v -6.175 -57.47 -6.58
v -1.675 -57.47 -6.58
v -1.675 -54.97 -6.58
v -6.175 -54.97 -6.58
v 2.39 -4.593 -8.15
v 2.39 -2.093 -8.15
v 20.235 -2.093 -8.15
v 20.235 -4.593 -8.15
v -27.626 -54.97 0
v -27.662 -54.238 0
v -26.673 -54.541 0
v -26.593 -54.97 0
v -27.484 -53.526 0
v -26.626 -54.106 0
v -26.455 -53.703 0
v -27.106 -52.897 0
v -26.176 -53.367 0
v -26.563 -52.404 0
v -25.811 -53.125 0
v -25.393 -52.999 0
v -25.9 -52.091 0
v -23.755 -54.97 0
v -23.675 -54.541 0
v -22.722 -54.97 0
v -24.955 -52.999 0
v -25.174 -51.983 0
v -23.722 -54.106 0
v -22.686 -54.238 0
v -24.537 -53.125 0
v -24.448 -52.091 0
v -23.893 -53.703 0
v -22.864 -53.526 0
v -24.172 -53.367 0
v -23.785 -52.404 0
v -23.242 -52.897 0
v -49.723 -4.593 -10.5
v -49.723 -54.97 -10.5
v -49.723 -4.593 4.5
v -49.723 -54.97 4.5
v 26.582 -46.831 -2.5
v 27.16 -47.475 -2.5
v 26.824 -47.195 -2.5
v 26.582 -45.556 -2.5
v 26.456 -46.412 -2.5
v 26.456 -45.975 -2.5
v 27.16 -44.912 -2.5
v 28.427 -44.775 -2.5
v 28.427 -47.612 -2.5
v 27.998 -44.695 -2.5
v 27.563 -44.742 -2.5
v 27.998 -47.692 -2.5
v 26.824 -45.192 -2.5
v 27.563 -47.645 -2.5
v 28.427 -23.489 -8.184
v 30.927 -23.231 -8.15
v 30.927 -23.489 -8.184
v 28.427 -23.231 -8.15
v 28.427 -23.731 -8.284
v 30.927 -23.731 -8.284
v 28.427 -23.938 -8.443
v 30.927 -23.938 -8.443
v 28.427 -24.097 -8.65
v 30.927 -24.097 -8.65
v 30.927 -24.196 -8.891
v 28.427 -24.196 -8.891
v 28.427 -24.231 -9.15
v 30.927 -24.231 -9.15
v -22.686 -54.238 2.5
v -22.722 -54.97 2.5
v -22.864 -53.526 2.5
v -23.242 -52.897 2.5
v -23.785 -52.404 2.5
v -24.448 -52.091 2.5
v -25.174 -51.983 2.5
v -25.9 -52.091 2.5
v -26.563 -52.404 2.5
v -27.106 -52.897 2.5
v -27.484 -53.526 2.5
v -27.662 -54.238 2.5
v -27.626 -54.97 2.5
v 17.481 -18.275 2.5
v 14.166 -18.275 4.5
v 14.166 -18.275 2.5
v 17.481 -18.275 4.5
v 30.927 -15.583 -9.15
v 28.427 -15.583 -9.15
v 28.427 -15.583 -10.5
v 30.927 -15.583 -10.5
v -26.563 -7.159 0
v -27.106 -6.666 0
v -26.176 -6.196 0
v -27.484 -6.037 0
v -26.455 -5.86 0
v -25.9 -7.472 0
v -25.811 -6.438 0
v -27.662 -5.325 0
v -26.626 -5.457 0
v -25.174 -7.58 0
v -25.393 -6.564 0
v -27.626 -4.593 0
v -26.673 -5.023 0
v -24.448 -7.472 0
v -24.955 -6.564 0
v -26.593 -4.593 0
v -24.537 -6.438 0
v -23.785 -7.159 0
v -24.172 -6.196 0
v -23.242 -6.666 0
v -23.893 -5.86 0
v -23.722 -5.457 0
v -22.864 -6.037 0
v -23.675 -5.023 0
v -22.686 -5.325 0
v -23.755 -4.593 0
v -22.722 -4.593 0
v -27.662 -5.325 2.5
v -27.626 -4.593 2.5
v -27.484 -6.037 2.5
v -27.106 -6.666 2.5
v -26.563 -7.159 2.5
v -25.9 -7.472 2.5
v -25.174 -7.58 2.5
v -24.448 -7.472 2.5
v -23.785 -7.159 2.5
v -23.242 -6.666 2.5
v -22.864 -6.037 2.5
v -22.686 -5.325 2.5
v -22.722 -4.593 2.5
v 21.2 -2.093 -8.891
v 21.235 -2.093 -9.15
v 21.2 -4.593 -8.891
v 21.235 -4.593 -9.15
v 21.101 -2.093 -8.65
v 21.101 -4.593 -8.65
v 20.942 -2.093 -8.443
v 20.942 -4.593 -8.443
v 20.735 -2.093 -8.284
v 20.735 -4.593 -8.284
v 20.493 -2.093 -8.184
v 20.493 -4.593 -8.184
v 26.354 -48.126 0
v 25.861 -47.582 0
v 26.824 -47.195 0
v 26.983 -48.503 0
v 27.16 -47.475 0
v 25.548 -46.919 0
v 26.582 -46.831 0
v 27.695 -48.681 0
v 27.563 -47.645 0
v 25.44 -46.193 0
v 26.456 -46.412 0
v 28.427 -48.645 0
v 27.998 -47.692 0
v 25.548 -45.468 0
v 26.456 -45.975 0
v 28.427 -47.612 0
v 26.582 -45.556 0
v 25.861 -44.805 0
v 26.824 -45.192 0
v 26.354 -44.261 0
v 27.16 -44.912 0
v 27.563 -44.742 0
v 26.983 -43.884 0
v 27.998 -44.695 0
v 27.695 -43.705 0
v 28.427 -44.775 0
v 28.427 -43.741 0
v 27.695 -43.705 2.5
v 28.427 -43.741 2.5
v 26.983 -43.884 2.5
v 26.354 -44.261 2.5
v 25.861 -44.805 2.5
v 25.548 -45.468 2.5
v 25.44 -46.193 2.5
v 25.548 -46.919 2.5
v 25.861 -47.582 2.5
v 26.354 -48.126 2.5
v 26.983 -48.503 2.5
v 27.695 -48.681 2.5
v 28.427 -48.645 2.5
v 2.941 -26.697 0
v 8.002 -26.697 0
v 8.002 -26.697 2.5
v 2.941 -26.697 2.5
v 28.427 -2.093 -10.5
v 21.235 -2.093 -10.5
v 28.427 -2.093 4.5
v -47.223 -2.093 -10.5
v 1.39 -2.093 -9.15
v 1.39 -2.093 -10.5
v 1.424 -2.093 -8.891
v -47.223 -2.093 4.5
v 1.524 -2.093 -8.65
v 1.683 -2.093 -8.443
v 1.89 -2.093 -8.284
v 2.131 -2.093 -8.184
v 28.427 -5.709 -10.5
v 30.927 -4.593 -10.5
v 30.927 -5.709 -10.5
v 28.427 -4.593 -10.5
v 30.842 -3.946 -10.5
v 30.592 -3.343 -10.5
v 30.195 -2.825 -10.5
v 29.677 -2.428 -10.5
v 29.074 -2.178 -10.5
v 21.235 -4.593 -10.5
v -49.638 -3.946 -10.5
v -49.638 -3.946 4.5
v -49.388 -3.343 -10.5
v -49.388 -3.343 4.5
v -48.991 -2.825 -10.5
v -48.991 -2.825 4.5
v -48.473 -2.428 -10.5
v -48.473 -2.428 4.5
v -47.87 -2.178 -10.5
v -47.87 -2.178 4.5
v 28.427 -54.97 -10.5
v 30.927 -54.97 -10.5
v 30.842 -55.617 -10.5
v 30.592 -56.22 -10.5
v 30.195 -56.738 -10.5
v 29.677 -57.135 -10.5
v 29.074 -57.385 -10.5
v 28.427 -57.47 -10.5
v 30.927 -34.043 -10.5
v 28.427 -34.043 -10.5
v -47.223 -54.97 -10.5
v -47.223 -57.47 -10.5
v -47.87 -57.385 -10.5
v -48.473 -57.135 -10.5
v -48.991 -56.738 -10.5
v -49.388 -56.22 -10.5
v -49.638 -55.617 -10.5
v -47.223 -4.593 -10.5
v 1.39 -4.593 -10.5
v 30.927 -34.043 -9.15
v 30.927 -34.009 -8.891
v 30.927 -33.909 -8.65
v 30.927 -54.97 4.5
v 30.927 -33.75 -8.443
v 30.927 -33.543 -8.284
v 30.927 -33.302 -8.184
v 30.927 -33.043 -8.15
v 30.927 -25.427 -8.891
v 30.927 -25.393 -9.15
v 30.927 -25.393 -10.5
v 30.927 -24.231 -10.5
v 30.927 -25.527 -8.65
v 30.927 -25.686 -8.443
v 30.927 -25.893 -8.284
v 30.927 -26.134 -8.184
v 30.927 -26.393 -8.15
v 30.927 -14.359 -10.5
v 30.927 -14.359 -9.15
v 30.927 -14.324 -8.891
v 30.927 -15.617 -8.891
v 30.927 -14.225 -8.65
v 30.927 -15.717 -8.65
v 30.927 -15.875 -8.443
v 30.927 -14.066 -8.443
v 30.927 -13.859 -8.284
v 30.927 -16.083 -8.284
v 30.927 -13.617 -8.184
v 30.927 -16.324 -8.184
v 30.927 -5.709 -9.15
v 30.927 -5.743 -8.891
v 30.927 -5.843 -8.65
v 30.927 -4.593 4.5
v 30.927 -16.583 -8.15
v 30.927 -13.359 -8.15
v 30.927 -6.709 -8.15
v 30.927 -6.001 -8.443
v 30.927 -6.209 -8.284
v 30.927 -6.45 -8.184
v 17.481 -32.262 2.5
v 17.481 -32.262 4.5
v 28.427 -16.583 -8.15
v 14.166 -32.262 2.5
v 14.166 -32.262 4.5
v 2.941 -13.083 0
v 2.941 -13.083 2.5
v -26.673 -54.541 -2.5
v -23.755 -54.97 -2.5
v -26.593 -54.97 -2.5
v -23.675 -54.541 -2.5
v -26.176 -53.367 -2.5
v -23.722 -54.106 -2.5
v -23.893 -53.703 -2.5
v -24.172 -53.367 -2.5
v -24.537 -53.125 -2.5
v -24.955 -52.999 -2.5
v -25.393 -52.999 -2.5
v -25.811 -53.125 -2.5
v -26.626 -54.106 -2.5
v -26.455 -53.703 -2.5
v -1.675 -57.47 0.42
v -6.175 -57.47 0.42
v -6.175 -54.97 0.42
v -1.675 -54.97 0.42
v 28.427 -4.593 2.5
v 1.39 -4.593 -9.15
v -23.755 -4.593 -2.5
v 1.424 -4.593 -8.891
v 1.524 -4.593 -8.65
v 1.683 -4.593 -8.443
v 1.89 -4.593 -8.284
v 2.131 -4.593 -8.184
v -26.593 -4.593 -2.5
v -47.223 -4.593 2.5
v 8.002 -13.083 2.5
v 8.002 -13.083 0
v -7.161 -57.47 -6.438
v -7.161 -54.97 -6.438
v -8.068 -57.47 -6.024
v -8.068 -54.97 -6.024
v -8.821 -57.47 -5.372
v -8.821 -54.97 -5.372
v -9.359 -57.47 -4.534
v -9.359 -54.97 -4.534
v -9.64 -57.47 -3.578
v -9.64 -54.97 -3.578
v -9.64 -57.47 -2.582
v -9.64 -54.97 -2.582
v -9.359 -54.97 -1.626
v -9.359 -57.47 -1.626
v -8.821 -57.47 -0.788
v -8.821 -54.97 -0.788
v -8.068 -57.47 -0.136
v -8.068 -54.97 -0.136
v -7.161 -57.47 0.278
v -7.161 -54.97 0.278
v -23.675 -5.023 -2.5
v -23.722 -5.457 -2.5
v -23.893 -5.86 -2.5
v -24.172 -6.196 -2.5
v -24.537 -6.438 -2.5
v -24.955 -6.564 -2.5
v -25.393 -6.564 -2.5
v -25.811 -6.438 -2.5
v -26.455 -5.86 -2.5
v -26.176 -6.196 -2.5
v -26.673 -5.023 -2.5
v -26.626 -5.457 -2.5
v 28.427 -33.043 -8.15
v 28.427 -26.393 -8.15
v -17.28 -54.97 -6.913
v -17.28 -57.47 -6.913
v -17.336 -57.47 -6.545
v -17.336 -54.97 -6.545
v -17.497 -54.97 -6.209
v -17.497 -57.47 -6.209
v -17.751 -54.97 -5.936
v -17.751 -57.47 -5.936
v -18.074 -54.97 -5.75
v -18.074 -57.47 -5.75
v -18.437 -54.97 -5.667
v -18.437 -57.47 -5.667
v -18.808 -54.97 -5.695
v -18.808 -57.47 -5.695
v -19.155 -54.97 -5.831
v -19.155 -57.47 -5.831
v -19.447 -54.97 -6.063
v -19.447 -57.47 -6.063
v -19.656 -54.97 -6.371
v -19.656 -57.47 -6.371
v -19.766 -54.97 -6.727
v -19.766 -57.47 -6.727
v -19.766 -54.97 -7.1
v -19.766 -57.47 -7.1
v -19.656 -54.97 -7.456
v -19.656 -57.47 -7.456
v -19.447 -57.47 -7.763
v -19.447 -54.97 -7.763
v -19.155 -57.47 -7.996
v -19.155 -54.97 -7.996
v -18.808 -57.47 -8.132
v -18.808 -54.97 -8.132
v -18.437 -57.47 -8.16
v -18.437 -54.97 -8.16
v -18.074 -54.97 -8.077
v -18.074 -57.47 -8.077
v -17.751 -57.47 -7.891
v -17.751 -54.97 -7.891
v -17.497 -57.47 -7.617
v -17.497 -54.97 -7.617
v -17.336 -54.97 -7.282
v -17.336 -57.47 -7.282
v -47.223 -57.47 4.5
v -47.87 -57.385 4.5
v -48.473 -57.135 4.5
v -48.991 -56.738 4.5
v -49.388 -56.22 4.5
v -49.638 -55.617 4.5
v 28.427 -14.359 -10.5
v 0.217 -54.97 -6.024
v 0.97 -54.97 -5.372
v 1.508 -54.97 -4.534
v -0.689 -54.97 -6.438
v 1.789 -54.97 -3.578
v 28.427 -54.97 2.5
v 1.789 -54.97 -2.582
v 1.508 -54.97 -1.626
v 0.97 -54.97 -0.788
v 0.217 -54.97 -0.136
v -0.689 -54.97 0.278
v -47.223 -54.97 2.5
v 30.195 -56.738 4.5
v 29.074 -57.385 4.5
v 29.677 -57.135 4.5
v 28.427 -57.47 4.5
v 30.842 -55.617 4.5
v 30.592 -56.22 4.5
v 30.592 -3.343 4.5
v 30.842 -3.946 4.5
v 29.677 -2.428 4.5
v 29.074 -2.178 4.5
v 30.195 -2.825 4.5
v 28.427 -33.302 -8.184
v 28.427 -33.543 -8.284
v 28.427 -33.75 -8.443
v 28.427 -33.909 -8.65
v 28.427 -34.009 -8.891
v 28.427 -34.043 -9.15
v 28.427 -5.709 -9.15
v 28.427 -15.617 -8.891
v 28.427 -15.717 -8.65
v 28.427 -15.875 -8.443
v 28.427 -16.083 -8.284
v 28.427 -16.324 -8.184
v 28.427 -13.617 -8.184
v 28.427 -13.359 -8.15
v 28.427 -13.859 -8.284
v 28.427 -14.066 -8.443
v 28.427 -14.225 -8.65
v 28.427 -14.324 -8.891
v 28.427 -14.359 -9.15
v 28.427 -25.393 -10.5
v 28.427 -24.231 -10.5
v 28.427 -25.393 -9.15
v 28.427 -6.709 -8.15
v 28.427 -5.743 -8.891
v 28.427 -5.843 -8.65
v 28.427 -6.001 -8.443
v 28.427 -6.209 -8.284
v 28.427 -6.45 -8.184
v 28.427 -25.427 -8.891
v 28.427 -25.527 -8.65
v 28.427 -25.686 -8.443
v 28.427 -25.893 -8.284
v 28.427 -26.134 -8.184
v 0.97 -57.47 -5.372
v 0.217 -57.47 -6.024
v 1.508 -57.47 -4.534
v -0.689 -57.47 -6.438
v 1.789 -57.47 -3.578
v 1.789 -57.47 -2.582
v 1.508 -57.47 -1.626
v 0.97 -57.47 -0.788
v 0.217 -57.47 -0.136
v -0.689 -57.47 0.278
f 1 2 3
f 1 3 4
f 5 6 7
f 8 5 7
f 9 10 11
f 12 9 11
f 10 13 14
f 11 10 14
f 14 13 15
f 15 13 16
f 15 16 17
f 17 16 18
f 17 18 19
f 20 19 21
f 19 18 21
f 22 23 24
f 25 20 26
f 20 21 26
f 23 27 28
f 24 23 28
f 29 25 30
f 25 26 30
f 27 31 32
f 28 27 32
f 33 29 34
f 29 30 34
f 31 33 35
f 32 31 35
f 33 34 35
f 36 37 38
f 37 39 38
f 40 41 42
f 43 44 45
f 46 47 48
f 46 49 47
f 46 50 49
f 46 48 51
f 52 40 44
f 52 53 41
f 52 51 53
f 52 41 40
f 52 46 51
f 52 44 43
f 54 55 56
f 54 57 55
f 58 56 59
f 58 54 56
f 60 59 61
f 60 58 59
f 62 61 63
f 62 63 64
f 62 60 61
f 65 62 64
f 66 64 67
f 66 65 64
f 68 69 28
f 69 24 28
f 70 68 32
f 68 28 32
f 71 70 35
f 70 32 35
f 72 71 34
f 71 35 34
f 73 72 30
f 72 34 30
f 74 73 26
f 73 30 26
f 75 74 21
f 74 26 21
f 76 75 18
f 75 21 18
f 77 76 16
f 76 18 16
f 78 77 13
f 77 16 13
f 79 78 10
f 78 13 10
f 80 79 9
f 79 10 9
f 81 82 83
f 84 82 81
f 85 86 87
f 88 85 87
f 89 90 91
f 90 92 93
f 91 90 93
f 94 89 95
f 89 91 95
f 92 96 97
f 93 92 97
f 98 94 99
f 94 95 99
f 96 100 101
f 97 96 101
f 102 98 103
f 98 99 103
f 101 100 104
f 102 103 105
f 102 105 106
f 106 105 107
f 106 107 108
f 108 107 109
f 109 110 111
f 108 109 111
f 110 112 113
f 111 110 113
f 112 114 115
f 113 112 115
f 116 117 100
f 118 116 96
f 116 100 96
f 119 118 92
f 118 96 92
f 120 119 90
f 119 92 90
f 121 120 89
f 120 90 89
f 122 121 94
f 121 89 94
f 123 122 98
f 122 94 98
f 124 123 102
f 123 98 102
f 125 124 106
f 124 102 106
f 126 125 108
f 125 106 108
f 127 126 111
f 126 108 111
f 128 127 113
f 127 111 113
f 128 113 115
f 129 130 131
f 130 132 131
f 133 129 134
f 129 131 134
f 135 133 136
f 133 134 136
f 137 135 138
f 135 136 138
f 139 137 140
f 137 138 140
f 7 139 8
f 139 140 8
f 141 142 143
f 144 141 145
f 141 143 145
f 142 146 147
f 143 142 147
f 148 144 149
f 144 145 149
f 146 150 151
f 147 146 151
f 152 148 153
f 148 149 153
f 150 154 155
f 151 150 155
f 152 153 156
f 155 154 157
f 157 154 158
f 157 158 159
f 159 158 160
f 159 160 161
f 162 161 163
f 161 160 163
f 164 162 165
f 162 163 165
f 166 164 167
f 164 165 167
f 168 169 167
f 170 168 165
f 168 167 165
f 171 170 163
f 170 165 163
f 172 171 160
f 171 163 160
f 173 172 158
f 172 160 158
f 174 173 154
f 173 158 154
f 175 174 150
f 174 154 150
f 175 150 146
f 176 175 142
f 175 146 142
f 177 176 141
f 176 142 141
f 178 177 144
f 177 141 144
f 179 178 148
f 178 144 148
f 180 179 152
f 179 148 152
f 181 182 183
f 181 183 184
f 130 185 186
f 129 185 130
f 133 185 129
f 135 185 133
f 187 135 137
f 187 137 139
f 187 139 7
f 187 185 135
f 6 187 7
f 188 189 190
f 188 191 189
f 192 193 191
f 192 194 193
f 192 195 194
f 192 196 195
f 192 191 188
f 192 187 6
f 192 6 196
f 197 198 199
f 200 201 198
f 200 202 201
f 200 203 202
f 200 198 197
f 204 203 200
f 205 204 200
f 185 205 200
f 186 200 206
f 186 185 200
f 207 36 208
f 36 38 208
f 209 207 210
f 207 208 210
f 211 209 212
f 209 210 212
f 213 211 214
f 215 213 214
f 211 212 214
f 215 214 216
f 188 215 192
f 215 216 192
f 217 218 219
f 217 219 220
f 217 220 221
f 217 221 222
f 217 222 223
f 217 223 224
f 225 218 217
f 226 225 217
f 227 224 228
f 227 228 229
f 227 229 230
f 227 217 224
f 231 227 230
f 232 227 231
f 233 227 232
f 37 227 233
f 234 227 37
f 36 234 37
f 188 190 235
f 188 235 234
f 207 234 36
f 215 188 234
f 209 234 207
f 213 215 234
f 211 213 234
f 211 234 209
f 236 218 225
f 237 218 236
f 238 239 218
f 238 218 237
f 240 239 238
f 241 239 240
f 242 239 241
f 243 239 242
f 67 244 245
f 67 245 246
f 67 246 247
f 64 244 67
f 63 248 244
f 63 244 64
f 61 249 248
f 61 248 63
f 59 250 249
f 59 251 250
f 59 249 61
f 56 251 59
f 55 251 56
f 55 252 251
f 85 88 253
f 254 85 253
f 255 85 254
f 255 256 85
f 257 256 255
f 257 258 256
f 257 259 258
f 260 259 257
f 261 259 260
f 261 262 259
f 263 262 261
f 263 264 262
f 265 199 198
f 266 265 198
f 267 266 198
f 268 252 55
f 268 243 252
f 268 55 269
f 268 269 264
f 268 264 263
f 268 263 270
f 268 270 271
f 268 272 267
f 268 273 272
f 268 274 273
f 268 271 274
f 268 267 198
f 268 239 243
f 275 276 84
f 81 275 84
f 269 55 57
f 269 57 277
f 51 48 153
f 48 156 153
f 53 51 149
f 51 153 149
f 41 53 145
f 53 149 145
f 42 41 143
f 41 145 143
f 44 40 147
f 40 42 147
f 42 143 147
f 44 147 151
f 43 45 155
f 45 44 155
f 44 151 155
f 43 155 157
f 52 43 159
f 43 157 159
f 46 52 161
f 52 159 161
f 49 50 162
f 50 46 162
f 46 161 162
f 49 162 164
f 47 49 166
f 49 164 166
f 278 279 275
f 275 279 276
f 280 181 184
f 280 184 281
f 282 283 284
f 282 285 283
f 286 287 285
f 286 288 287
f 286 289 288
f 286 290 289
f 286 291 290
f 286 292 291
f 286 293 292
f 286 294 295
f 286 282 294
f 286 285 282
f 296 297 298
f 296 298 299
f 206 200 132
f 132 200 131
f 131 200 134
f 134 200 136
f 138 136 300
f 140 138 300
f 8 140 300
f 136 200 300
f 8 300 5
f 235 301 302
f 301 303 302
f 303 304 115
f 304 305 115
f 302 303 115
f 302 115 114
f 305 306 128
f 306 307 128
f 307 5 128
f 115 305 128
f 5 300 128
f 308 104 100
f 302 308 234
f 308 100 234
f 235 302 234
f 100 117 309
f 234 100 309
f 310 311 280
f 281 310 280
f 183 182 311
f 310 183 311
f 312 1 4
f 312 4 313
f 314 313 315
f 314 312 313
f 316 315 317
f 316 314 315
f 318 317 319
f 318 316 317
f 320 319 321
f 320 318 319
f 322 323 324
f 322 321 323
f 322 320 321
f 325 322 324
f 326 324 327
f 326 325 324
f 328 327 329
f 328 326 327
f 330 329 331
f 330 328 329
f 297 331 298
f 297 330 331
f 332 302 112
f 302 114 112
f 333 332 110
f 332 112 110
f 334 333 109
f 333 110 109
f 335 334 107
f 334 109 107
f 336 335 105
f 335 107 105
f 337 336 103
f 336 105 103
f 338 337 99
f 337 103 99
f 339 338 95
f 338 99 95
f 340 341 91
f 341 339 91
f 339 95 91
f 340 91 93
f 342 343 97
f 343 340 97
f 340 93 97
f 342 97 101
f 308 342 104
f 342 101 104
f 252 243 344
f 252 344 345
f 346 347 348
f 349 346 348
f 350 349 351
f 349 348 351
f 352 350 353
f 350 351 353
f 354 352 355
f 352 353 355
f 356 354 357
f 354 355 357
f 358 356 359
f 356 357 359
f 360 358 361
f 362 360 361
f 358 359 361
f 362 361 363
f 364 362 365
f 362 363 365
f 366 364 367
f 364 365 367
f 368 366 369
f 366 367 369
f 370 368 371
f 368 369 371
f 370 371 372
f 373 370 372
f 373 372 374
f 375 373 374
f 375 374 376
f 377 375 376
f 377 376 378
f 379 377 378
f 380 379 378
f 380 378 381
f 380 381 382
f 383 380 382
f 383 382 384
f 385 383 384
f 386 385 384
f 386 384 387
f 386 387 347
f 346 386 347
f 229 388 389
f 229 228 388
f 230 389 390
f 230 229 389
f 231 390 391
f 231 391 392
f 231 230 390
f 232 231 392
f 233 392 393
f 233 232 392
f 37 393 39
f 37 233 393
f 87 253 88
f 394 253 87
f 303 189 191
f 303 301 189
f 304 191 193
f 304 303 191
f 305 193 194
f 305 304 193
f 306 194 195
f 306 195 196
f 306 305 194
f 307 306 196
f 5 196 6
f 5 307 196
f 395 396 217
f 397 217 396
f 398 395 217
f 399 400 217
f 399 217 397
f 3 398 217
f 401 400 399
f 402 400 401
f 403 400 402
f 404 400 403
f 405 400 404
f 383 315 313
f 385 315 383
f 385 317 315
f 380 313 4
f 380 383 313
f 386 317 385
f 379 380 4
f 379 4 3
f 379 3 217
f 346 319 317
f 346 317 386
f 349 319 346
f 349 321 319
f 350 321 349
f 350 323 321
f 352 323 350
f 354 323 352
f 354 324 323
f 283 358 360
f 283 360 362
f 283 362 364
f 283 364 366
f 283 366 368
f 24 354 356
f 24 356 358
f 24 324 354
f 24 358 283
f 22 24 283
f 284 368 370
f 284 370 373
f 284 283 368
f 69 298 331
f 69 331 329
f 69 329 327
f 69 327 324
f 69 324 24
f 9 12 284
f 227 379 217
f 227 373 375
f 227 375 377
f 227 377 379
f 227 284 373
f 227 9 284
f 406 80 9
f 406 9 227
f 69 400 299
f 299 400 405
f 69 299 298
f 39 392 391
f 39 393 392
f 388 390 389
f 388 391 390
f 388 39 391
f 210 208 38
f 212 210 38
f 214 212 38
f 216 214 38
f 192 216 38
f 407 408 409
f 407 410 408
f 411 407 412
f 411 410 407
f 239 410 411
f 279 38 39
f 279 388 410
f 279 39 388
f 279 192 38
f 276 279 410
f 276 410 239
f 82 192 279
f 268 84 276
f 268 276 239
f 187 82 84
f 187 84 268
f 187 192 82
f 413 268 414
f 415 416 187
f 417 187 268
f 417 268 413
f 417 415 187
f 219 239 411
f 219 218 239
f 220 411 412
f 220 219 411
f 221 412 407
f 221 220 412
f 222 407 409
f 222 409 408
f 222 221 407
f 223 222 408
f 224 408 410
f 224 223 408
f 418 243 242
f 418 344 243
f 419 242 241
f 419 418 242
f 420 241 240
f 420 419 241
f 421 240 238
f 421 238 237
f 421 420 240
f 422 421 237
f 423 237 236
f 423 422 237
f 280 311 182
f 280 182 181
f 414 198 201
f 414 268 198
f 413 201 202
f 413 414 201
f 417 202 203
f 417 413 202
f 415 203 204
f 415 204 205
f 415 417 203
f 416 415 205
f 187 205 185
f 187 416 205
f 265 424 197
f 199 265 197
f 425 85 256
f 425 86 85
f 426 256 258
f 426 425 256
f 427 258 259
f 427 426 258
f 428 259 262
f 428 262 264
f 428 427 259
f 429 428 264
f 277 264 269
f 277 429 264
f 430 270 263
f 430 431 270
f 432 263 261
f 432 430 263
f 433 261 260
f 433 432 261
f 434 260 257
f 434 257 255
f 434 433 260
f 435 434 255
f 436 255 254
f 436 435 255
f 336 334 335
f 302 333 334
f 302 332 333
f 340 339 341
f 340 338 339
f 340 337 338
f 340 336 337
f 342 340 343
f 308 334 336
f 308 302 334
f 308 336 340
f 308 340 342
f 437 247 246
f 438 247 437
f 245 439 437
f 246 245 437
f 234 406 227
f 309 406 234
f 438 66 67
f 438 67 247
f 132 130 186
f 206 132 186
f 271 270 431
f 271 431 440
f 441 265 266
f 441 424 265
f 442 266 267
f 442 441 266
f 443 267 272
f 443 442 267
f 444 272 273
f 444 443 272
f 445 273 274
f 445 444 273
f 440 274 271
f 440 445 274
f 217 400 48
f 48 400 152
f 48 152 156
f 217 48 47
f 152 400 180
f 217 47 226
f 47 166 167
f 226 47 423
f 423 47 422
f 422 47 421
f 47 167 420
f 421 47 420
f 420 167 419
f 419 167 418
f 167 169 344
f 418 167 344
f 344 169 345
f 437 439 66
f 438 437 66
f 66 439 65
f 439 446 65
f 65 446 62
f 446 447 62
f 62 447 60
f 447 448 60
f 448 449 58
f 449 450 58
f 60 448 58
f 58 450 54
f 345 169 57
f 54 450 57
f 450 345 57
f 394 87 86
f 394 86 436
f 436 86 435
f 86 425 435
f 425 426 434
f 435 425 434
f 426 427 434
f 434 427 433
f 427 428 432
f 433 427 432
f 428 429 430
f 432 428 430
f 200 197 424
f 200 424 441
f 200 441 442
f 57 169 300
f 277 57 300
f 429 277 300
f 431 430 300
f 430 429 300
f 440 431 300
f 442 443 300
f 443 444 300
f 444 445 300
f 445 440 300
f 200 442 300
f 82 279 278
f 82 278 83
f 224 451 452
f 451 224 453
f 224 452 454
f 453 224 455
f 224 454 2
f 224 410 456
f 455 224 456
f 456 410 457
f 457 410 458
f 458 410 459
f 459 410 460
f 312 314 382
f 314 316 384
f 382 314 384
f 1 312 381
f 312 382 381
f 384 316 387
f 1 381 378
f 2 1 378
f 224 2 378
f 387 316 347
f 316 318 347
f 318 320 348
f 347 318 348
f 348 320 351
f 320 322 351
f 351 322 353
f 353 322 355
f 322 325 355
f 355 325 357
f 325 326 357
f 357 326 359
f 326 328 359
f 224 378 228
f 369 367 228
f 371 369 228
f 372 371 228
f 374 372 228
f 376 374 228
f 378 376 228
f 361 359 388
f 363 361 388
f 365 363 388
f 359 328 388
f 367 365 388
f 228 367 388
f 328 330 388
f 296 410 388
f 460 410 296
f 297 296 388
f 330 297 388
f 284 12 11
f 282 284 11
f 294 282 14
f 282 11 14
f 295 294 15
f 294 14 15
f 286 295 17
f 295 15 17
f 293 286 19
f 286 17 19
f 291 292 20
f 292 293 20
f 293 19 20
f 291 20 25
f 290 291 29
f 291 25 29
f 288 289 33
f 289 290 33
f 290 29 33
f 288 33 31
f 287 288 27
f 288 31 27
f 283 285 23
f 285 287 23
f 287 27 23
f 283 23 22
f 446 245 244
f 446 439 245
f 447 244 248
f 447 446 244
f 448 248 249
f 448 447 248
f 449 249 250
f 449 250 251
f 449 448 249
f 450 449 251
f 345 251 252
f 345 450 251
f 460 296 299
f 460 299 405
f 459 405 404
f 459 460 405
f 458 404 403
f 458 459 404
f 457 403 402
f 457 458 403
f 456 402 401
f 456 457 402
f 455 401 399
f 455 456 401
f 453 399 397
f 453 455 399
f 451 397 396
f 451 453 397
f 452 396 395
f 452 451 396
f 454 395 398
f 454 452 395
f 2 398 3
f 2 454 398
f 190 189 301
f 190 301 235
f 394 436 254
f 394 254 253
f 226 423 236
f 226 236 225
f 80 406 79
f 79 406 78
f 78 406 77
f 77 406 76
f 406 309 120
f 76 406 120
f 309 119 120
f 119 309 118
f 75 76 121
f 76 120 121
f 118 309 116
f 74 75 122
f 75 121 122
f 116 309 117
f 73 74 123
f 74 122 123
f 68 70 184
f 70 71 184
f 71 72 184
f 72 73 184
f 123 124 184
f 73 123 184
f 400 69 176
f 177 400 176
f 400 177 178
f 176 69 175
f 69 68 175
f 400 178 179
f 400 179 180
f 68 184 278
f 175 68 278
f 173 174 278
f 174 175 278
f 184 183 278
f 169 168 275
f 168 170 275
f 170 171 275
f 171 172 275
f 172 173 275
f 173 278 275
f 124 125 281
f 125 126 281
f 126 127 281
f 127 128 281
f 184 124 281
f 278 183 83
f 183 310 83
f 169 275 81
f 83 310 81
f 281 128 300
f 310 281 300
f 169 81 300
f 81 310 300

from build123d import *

# Parameters (mm, degrees)
SKETCH_1_R          = 2.5
EXTRUDE_1_DEPTH     = 2.5
EXTRUDE_1_2_DEPTH   = 2.5
EXTRUDE_1_3_DEPTH   = 2.5
SKETCH_2_R          = 1.5
EXTRUDE_2_DEPTH     = 2.5
SKETCH_3_W          = 5.060610533
SKETCH_3_H          = 13.613755096
EXTRUDE_3_DEPTH     = 2.5
SKETCH_4_W          = 80.650749302
SKETCH_4_H          = 55.377698756
EXTRUDE_4_DEPTH     = 2
SKETCH_5_W          = 80.650749302
SKETCH_5_H          = 55.377698756
SKETCH_5_W_2        = 75.650749302
SKETCH_5_H_2        = 50.377698756
EXTRUDE_5_DEPTH     = 13
FILLET_1_R          = 2.5
CUT_EXTRUDE_1_DEPTH = 2.6
SKETCH_8_W          = 3.315326588
SKETCH_8_H          = 13.986534041
CUT_EXTRUDE_2_DEPTH = 2
SKETCH_9_W          = 2.35
SKETCH_9_H          = 8.65
SKETCH_9_H_2        = 8.647957695
CUT_EXTRUDE_3_DEPTH = 3
FILLET_2_R          = 1
SKETCH_10_W         = 19.844488107
SKETCH_10_H         = 2.35
CUT_EXTRUDE_4_DEPTH = 3
FILLET_3_R          = 1
SKETCH_11_R         = 1.25
CUT_EXTRUDE_5_DEPTH = 6.8


with BuildPart() as part:
    # 草图1 → 凸台-拉伸1 (new body)
    with BuildSketch(Plane.XY):
        with Locations((-25.173975108, -5.08001016)):
            Circle(SKETCH_1_R)
    extrude(amount=EXTRUDE_1_DEPTH)



with BuildPart() as body_2:
    # 草图1 → Extrude 1 2 (new body)
    with BuildSketch(Plane.XY):
        with Locations((-25.173975108, -54.483108966)):
            Circle(SKETCH_1_R)
    extrude(amount=EXTRUDE_1_2_DEPTH)


with BuildPart() as body_3:
    # 草图1 → Extrude 1 3 (new body)
    with BuildSketch(Plane.XY):
        with Locations((27.94005588, -46.193418847)):
            Circle(SKETCH_1_R)
    extrude(amount=EXTRUDE_1_3_DEPTH)


with BuildPart() as part_1:
    add(part.part)

    add(body_2.part)  # 凸台-拉伸2 merges body 2

    add(body_3.part)  # 凸台-拉伸2 merges body 3
    # 草图2 → 凸台-拉伸2 (add)
    with BuildSketch(Plane(origin=(0, 0, 0), x_dir=(-1, 0, 0), z_dir=(0, 0, -1))):
        with Locations((25.173975108, -5.08001016)):
            Circle(SKETCH_2_R)
        with Locations((25.173975108, -54.483108966)):
            Circle(SKETCH_2_R)
        with Locations((-27.94005588, -46.193418847)):
            Circle(SKETCH_2_R)
    extrude(amount=EXTRUDE_2_DEPTH)



with BuildPart() as body_2_2:
    # 草图3 → 凸台-拉伸3 (new body)
    with BuildSketch(Plane(origin=(0, 0, 0), x_dir=(-1, 0, 0), z_dir=(0, 0, -1))):
        with Locations((-5.471223868, -19.889889862)):
            Rectangle(SKETCH_3_W, SKETCH_3_H)
    extrude(amount=-EXTRUDE_3_DEPTH)


with BuildPart() as part_2:
    add(part_1.part)

    add(body_2_2.part)  # 凸台-拉伸4 merges body 2 2
    # 草图4 → 凸台-拉伸4 (add)
    with BuildSketch(Plane.XY.offset(2.5)):
        with Locations((-9.398018796, -29.781559563)):
            Rectangle(SKETCH_4_W, SKETCH_4_H)
    extrude(amount=EXTRUDE_4_DEPTH)

    # 草图5 → 凸台-拉伸5 (add)
    with BuildSketch(Plane(origin=(0, 0, 2.5), x_dir=(-1, 0, 0), z_dir=(0, 0, -1))):
        with Locations((9.398018796, -29.781559563)):
            Rectangle(SKETCH_5_W, SKETCH_5_H)
        with Locations((9.398018796, -29.781559563)):
            Rectangle(SKETCH_5_W_2, SKETCH_5_H_2, mode=Mode.SUBTRACT)
    extrude(amount=EXTRUDE_5_DEPTH)

    # 圆角1
    fillet_1_edges = [part_2.edges().sort_by_distance(p)[0] for p in [
        (-49.723393447, -2.092710185, -3),
        (-49.723393447, -57.470408941, -3),
        (30.927355855, -57.470408941, -3),
        (30.927355855, -2.092710185, -3),
    ]]
    fillet(fillet_1_edges, radius=FILLET_1_R)

    # 草图7 → 切除-拉伸1 (cut)
    with BuildSketch(Plane.XZ.offset(57.470408941)):
        with BuildLine():
            Line((-1.675382515, -6.58006372), (-6.175382515, -6.58006372))
            ThreePointArc((-6.175382515, -6.58006372), (-9.675382515, -3.08006372), (-6.175382515, 0.41993628))
            Line((-6.175382515, 0.41993628), (-1.675382515, 0.41993628))
            ThreePointArc((-1.675382515, 0.41993628), (1.824617485, -3.08006372), (-1.675382515, -6.58006372))
        make_face()
    extrude(amount=-CUT_EXTRUDE_1_DEPTH, mode=Mode.SUBTRACT)

    # 草图8 → 切除-拉伸2 (cut)
    with BuildSketch(Plane.XY.offset(4.5)):
        with Locations((15.823203351, -25.268606613)):
            Rectangle(SKETCH_8_W, SKETCH_8_H)
    extrude(amount=-CUT_EXTRUDE_2_DEPTH, mode=Mode.SUBTRACT)

    # 草图9 → 切除-拉伸3 (cut)
    with BuildSketch(Plane(origin=(30.927355855, 0, 0), x_dir=(0, 0, -1), z_dir=(1, 0, 0))):
        with Locations((9.325, -10.033571247)):
            Rectangle(SKETCH_9_W, SKETCH_9_H)
        with Locations((9.325, -19.906568383)):
            Rectangle(SKETCH_9_W, SKETCH_9_H_2)
        with Locations((9.325, -29.718110236)):
            Rectangle(SKETCH_9_W, SKETCH_9_H)
    extrude(amount=-CUT_EXTRUDE_3_DEPTH, mode=Mode.SUBTRACT)

    # 圆角2
    fillet_2_edges = [part_2.edges().sort_by_distance(p)[0] for p in [
        (29.677355855, -14.358571247, -8.15),
        (29.677355855, -5.708571247, -8.15),
        (29.677355855, -24.23054723, -8.15),
        (29.677355855, -15.582589535, -8.15),
        (29.677355855, -34.043110236, -8.15),
        (29.677355855, -25.393110236, -8.15),
    ]]
    fillet(fillet_2_edges, radius=FILLET_2_R)

    # 草图10 → 切除-拉伸4 (cut)
    with BuildSketch(Plane(origin=(0, -2.092710185, 0), x_dir=(1, 0, 0), z_dir=(0, 1, 0))):
        with Locations((11.312306284, 9.325)):
            Rectangle(SKETCH_10_W, SKETCH_10_H)
    extrude(amount=-CUT_EXTRUDE_4_DEPTH, mode=Mode.SUBTRACT)

    # 圆角3
    fillet_3_edges = [part_2.edges().sort_by_distance(p)[0] for p in [
        (21.234550337, -3.342710185, -8.15),
        (1.39006223, -3.342710185, -8.15),
    ]]
    fillet(fillet_3_edges, radius=FILLET_3_R)

    # 草图11 → 切除-拉伸5 (cut)
    with BuildSketch(Plane.XZ.offset(57.470408941)):
        with Locations((-18.53025758, -6.91322852)):
            Circle(SKETCH_11_R)
    extrude(amount=-CUT_EXTRUDE_5_DEPTH, mode=Mode.SUBTRACT)


solid = part_2.part
